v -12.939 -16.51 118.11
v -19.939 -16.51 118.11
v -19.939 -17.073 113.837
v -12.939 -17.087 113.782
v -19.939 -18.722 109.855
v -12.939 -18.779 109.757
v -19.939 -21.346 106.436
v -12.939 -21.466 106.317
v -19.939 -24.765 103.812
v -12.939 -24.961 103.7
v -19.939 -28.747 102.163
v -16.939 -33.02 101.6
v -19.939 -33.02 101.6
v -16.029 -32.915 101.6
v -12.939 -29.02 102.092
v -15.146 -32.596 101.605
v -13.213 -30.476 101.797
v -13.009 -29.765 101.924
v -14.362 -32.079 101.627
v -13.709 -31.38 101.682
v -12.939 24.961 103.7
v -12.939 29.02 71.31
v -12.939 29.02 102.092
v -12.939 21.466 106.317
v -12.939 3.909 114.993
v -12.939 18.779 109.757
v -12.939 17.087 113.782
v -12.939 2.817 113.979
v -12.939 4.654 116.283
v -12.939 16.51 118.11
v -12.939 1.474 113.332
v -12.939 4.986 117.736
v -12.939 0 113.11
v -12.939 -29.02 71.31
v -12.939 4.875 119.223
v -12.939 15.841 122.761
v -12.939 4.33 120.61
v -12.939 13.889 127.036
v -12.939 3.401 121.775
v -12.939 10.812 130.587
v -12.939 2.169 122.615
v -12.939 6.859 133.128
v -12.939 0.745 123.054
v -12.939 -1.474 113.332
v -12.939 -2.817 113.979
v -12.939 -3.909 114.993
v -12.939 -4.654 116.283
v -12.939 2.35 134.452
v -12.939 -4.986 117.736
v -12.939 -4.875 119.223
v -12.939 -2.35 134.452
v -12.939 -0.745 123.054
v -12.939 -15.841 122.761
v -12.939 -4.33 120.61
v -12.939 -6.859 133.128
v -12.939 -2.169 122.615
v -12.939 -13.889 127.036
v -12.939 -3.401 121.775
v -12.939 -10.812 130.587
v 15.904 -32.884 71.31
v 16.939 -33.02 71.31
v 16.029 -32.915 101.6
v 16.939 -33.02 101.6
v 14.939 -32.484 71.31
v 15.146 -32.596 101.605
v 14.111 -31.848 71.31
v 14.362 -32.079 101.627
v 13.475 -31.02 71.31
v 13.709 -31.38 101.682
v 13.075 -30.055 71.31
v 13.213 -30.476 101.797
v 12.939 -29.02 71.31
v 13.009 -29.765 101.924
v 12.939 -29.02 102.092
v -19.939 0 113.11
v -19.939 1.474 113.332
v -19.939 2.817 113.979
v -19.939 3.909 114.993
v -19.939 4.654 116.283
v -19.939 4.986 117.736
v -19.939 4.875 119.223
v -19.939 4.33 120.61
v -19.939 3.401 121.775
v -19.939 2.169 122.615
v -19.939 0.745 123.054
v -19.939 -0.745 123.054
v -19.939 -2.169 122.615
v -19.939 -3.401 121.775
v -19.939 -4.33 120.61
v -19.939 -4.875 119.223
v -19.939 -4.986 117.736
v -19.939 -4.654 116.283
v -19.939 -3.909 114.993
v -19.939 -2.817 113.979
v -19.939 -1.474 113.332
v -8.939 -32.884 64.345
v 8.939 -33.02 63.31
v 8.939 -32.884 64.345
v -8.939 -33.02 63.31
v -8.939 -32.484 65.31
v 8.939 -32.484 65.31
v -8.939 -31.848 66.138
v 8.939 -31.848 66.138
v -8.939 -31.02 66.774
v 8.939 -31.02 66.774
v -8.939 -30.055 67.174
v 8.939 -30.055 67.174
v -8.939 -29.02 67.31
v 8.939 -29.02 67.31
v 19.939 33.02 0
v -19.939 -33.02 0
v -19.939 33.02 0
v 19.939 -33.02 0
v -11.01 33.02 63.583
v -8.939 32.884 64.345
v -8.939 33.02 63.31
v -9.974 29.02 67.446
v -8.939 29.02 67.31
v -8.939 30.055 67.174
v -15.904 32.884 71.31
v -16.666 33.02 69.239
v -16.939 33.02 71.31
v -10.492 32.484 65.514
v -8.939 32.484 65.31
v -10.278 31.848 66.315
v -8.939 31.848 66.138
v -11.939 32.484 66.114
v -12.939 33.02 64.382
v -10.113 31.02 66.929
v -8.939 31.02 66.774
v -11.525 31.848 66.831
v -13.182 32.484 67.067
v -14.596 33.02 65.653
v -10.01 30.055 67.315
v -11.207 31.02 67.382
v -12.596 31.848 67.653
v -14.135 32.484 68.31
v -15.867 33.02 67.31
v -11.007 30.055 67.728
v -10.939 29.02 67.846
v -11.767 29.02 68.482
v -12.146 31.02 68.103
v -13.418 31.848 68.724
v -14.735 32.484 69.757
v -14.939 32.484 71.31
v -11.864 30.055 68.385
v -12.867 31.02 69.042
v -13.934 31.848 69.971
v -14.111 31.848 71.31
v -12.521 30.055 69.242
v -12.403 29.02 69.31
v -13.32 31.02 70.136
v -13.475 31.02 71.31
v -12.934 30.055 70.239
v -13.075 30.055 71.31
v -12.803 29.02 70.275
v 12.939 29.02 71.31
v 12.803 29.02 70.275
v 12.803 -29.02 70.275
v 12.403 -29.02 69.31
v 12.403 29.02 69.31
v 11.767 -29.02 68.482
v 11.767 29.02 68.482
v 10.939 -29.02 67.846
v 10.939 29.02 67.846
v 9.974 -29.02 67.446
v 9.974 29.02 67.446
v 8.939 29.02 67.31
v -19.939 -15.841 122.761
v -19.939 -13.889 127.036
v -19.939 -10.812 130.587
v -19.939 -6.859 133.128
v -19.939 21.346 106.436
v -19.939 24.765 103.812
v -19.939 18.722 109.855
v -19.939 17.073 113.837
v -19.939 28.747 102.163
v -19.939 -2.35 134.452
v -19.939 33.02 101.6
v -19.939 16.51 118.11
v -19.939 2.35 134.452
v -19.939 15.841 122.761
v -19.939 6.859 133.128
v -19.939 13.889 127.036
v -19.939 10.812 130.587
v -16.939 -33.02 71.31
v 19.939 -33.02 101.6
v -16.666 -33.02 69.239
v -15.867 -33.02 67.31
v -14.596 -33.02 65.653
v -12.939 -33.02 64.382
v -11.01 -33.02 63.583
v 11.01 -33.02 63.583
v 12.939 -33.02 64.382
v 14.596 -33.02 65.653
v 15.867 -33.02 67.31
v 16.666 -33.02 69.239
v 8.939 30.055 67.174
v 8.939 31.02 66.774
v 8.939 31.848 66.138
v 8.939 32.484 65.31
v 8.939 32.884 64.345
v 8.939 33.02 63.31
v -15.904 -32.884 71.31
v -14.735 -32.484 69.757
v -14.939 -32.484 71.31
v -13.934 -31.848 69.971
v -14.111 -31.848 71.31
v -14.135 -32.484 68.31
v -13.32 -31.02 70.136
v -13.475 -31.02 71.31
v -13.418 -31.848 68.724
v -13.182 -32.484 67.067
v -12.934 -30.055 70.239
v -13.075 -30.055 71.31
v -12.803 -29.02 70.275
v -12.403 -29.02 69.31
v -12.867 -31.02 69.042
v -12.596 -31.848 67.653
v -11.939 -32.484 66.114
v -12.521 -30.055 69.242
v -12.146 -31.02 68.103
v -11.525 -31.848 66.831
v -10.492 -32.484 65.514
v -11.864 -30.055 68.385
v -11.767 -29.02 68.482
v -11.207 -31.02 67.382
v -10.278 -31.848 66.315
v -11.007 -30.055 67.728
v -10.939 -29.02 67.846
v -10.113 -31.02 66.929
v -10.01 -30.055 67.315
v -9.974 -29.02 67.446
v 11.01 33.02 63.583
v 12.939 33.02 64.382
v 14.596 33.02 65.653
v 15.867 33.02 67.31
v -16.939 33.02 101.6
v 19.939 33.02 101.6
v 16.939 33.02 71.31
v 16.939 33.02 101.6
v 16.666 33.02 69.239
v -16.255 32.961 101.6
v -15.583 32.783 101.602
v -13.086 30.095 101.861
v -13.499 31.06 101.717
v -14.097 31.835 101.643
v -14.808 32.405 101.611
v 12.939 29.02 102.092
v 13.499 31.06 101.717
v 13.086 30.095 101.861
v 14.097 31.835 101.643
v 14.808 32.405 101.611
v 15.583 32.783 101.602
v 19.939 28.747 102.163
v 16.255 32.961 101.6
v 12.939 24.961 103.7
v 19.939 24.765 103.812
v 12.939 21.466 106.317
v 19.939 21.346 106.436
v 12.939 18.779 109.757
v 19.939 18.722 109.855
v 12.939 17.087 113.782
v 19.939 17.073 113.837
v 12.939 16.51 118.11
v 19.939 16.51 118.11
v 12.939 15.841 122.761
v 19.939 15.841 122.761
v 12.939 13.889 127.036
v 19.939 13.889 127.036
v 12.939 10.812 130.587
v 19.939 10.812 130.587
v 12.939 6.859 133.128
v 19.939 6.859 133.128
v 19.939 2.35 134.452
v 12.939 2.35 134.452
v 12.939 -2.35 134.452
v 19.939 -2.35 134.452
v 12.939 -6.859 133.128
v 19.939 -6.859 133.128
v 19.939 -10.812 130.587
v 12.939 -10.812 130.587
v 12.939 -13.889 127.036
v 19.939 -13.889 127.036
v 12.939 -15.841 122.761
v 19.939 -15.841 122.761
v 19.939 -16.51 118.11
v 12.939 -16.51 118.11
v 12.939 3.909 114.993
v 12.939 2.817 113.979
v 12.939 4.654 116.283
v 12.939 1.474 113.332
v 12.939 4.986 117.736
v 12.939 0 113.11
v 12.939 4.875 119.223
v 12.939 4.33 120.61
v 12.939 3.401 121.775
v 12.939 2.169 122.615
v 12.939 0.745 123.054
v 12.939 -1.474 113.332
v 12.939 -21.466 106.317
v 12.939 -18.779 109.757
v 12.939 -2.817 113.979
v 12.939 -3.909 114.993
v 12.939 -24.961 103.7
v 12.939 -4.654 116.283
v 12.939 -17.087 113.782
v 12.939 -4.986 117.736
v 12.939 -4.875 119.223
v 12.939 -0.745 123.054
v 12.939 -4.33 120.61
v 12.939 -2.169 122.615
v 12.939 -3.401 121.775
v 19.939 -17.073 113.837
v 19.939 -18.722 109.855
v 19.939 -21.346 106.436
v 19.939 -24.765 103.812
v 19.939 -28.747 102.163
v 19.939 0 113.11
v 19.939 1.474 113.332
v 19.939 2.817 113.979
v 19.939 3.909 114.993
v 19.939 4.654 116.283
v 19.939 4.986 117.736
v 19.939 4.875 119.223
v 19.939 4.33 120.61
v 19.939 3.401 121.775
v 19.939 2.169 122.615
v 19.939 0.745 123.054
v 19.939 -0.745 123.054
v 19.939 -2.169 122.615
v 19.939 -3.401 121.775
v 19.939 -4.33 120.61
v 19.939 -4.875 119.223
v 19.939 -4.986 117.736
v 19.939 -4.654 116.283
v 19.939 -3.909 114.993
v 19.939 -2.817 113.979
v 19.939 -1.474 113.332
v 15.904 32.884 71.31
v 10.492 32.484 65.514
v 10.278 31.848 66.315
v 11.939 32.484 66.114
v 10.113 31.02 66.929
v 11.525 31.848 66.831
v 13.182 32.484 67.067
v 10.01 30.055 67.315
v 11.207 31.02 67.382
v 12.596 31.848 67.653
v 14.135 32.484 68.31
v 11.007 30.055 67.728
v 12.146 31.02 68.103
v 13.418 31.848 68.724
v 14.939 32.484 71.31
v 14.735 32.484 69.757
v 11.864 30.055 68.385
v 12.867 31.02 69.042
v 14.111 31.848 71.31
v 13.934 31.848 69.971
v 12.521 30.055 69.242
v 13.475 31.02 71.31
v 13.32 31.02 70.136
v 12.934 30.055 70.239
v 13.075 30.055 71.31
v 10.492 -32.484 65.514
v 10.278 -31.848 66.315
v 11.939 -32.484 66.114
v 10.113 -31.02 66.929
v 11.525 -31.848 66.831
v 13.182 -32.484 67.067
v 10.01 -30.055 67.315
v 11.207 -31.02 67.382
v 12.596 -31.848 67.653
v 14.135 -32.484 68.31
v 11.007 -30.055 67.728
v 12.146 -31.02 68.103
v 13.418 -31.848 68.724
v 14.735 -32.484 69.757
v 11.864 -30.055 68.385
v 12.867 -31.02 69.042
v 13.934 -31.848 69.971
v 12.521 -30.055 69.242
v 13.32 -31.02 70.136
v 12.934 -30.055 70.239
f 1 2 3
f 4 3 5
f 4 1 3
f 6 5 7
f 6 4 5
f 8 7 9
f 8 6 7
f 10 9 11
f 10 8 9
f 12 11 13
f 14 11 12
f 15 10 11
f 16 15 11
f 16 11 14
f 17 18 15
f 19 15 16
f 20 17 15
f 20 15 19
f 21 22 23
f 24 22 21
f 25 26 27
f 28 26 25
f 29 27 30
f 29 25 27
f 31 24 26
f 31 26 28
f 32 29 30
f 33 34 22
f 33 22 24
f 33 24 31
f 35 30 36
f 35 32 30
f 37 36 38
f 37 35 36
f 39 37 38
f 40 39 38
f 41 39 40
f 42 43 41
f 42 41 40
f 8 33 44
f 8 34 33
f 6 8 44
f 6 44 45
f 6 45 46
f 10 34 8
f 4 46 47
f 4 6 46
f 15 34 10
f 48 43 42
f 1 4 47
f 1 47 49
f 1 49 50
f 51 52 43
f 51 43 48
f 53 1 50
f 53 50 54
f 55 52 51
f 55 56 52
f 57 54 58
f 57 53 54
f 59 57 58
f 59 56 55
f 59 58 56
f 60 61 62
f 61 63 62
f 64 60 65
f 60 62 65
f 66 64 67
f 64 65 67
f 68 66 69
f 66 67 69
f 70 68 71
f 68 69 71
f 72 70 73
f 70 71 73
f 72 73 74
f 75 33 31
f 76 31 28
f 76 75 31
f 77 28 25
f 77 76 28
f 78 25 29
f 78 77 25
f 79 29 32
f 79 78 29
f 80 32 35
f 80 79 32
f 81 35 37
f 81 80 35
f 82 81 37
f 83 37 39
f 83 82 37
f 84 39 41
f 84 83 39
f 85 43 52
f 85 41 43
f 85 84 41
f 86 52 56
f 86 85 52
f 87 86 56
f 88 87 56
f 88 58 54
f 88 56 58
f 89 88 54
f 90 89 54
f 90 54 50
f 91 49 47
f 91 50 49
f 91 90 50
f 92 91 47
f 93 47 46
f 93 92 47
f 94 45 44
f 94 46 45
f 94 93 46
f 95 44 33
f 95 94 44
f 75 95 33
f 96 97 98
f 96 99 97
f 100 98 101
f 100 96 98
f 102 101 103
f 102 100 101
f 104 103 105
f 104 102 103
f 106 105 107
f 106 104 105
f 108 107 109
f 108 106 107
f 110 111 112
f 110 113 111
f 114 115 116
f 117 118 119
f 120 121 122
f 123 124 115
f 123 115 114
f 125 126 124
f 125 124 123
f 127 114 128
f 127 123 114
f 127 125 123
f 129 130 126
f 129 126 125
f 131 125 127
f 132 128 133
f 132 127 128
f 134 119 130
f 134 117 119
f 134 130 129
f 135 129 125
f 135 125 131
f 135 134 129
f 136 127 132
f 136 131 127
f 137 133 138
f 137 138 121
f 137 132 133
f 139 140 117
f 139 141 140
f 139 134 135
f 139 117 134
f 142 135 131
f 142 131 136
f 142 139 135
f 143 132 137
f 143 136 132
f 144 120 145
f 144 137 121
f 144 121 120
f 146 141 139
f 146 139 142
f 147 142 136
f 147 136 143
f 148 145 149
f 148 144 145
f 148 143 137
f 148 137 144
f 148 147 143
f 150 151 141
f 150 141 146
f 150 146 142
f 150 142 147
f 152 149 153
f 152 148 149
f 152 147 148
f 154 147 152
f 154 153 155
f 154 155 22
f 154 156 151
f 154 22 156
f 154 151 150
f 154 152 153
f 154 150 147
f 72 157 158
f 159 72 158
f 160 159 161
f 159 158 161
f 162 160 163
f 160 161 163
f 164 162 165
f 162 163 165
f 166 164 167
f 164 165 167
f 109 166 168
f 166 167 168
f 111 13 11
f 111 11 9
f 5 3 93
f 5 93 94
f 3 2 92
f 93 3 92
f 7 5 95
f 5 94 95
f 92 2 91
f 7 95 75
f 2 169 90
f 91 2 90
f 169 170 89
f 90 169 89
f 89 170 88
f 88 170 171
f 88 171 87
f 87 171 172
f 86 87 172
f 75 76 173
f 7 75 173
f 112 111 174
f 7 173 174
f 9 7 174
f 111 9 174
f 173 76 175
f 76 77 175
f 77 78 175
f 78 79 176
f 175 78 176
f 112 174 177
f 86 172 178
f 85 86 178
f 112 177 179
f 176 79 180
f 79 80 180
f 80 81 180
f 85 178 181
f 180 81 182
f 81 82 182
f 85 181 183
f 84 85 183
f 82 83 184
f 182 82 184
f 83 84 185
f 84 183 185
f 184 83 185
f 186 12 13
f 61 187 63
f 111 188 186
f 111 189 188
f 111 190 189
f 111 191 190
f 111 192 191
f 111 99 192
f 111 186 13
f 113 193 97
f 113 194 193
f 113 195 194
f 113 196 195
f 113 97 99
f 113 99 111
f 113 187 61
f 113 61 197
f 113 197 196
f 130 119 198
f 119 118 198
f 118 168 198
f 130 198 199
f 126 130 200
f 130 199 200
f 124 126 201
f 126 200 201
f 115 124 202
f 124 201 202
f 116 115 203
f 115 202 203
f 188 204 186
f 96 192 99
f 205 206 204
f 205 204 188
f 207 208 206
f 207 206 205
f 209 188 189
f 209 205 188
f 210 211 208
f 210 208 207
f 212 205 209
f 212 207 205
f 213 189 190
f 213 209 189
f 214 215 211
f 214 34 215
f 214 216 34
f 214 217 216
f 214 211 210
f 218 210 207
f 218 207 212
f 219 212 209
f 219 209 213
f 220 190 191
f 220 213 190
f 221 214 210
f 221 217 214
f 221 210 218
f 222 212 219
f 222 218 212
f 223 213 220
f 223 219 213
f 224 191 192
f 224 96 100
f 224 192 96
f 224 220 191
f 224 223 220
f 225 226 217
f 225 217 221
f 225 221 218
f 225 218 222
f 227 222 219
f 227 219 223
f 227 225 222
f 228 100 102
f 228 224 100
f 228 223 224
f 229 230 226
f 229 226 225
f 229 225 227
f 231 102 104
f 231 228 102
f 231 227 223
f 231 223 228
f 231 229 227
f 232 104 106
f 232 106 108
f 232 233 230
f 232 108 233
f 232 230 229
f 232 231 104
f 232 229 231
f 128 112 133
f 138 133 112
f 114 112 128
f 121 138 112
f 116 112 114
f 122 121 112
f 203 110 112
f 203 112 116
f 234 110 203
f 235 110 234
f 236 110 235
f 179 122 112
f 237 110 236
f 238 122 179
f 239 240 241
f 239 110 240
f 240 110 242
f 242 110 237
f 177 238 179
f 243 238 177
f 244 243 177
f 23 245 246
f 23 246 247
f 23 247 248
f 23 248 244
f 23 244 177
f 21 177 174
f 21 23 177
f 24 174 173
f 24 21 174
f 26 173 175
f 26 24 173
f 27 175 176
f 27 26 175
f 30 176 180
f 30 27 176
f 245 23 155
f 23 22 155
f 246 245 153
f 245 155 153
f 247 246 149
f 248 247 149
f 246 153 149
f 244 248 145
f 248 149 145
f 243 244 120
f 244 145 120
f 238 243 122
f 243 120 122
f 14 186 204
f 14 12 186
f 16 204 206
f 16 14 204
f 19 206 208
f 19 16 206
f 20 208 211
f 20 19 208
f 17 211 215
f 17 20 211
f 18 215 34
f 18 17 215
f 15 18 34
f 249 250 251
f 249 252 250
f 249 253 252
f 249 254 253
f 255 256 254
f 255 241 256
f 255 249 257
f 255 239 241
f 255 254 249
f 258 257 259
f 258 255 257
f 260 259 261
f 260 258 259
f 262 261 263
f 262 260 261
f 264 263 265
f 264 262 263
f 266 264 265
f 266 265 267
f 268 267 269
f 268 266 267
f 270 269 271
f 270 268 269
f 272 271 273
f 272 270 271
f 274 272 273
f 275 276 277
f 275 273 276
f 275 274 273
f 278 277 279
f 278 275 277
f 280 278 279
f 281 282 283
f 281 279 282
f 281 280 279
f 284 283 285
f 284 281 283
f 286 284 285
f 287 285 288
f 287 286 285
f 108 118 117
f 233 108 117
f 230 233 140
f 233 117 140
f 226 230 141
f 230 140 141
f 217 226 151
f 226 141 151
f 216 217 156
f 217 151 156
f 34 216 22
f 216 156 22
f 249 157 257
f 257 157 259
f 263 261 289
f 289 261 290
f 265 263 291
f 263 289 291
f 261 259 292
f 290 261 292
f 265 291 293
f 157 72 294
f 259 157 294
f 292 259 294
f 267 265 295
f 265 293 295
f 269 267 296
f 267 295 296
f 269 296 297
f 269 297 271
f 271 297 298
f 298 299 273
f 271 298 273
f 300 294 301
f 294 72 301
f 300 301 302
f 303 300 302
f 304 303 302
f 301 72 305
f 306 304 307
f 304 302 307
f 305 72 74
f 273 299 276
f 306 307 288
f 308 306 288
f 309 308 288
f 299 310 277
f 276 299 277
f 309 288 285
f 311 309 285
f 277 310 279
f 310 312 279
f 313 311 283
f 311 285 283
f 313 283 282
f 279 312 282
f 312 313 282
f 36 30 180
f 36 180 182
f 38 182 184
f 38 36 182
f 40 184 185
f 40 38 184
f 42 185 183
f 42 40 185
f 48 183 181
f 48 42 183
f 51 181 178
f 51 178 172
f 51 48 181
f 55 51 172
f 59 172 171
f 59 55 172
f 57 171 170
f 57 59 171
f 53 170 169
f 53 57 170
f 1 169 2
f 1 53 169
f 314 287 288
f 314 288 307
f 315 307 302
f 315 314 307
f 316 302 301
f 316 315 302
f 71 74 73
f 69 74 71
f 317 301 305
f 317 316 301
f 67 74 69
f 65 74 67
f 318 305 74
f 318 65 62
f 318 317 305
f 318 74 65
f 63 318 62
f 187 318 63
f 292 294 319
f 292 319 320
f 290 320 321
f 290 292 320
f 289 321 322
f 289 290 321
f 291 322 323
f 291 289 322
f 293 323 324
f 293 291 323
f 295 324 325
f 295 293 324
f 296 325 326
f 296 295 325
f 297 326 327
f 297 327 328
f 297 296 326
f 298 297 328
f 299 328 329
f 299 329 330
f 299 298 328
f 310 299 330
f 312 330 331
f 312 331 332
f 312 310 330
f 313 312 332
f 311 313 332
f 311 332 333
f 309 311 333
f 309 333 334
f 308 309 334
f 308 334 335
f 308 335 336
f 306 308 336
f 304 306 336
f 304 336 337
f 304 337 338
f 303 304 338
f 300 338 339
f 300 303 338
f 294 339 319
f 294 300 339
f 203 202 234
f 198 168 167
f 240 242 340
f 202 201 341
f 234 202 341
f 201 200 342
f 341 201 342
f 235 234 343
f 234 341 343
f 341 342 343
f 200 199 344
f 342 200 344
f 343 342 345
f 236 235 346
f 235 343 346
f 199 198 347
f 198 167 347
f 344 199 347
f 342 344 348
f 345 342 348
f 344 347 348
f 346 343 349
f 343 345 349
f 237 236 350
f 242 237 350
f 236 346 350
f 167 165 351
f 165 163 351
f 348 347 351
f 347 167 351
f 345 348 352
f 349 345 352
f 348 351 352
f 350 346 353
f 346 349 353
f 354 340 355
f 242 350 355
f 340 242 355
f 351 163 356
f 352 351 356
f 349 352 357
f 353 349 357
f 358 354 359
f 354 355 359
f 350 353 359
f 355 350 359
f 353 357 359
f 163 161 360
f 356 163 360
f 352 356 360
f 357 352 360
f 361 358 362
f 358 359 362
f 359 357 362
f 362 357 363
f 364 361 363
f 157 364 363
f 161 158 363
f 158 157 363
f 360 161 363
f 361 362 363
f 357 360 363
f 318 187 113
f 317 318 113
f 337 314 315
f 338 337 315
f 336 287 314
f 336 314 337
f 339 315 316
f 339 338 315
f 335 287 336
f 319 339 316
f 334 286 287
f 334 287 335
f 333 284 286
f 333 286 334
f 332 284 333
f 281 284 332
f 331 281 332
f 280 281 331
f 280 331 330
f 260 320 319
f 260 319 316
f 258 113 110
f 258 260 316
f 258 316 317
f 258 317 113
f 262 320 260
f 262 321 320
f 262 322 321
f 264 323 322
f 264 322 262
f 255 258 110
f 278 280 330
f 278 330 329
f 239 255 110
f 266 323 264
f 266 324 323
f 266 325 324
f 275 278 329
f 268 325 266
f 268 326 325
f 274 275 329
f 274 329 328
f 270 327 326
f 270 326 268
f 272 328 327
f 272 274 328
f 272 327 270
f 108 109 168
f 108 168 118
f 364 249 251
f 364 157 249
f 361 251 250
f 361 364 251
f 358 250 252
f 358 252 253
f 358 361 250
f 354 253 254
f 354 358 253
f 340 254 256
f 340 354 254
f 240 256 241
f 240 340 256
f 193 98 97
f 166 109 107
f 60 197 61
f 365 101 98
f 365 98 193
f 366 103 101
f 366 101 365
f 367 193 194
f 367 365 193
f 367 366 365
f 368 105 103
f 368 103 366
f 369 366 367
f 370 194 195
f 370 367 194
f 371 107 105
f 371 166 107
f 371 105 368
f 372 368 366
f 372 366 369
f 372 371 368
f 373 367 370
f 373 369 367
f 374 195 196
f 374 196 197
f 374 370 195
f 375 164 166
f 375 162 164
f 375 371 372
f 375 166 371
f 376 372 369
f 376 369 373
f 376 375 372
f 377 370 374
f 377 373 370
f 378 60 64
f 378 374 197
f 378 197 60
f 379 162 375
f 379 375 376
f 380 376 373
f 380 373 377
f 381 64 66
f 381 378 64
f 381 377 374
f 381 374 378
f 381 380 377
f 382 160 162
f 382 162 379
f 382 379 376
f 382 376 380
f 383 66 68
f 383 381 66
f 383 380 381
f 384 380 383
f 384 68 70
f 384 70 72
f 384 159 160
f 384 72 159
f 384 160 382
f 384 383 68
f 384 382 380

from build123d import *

# Parameters (mm, degrees)
SKETCH2_R               = 5
BOSS_EXTRUDE1_DEPTH     = 19.939
CUT_EXTRUDE1_DEPTH      = 141.037239765
CUT_EXTRUDE1_DEPTH_BACK = 141.037239765
SKETCH3_W               = 25.878
SKETCH3_H               = 67.31
FILLET1_R               = 4


with BuildPart() as part:
    # Sketch2 → Boss-Extrude1 (new, symmetric)
    with BuildSketch(Plane.YZ):
        with BuildLine():
            Line((-33.02, 0), (33.02, 0))
            Line((33.02, 0), (33.02, 101.6))
            ThreePointArc((33.02, 101.6), (21.345667043, 106.435667043), (16.51, 118.11))
            ThreePointArc((16.51, 118.11), (0, 134.62), (-16.51, 118.11))
            ThreePointArc((-16.51, 118.11), (-21.345667043, 106.435667043), (-33.02, 101.6))
            Line((-33.02, 101.6), (-33.02, 0))
        make_face()
        with Locations(Location((0, 118.11, 0), (0, 0, 270))):
            Circle(SKETCH2_R, mode=Mode.SUBTRACT)
    extrude(amount=BOSS_EXTRUDE1_DEPTH, both=True)

    # Sketch3 → Cut-Extrude1 (cut, two sides: drawn at the far end of the back side and taken through both)
    with BuildSketch(Plane(origin=(0, 0, 0), x_dir=(-1, 0, 0), z_dir=(0, 1, 0)).offset(-CUT_EXTRUDE1_DEPTH_BACK)):
        with Locations((0, 100.965)):
            Rectangle(SKETCH3_W, SKETCH3_H)
    extrude(amount=CUT_EXTRUDE1_DEPTH + CUT_EXTRUDE1_DEPTH_BACK, mode=Mode.SUBTRACT)

    # Fillet1
    fillet1_edges = [part.edges().sort_by_distance(p)[0] for p in [
        (12.939, 33.02, 84.455),
        (-12.939, -33.02, 84.455),
        (0, -33.02, 67.31),
        (-12.939, 33.02, 84.455),
        (12.939, -33.02, 84.455),
        (12.939, 0, 67.31),
        (-12.939, 0, 67.31),
        (0, 33.02, 67.31),
    ]]
    fillet(fillet1_edges, radius=FILLET1_R)


solid = part.part
